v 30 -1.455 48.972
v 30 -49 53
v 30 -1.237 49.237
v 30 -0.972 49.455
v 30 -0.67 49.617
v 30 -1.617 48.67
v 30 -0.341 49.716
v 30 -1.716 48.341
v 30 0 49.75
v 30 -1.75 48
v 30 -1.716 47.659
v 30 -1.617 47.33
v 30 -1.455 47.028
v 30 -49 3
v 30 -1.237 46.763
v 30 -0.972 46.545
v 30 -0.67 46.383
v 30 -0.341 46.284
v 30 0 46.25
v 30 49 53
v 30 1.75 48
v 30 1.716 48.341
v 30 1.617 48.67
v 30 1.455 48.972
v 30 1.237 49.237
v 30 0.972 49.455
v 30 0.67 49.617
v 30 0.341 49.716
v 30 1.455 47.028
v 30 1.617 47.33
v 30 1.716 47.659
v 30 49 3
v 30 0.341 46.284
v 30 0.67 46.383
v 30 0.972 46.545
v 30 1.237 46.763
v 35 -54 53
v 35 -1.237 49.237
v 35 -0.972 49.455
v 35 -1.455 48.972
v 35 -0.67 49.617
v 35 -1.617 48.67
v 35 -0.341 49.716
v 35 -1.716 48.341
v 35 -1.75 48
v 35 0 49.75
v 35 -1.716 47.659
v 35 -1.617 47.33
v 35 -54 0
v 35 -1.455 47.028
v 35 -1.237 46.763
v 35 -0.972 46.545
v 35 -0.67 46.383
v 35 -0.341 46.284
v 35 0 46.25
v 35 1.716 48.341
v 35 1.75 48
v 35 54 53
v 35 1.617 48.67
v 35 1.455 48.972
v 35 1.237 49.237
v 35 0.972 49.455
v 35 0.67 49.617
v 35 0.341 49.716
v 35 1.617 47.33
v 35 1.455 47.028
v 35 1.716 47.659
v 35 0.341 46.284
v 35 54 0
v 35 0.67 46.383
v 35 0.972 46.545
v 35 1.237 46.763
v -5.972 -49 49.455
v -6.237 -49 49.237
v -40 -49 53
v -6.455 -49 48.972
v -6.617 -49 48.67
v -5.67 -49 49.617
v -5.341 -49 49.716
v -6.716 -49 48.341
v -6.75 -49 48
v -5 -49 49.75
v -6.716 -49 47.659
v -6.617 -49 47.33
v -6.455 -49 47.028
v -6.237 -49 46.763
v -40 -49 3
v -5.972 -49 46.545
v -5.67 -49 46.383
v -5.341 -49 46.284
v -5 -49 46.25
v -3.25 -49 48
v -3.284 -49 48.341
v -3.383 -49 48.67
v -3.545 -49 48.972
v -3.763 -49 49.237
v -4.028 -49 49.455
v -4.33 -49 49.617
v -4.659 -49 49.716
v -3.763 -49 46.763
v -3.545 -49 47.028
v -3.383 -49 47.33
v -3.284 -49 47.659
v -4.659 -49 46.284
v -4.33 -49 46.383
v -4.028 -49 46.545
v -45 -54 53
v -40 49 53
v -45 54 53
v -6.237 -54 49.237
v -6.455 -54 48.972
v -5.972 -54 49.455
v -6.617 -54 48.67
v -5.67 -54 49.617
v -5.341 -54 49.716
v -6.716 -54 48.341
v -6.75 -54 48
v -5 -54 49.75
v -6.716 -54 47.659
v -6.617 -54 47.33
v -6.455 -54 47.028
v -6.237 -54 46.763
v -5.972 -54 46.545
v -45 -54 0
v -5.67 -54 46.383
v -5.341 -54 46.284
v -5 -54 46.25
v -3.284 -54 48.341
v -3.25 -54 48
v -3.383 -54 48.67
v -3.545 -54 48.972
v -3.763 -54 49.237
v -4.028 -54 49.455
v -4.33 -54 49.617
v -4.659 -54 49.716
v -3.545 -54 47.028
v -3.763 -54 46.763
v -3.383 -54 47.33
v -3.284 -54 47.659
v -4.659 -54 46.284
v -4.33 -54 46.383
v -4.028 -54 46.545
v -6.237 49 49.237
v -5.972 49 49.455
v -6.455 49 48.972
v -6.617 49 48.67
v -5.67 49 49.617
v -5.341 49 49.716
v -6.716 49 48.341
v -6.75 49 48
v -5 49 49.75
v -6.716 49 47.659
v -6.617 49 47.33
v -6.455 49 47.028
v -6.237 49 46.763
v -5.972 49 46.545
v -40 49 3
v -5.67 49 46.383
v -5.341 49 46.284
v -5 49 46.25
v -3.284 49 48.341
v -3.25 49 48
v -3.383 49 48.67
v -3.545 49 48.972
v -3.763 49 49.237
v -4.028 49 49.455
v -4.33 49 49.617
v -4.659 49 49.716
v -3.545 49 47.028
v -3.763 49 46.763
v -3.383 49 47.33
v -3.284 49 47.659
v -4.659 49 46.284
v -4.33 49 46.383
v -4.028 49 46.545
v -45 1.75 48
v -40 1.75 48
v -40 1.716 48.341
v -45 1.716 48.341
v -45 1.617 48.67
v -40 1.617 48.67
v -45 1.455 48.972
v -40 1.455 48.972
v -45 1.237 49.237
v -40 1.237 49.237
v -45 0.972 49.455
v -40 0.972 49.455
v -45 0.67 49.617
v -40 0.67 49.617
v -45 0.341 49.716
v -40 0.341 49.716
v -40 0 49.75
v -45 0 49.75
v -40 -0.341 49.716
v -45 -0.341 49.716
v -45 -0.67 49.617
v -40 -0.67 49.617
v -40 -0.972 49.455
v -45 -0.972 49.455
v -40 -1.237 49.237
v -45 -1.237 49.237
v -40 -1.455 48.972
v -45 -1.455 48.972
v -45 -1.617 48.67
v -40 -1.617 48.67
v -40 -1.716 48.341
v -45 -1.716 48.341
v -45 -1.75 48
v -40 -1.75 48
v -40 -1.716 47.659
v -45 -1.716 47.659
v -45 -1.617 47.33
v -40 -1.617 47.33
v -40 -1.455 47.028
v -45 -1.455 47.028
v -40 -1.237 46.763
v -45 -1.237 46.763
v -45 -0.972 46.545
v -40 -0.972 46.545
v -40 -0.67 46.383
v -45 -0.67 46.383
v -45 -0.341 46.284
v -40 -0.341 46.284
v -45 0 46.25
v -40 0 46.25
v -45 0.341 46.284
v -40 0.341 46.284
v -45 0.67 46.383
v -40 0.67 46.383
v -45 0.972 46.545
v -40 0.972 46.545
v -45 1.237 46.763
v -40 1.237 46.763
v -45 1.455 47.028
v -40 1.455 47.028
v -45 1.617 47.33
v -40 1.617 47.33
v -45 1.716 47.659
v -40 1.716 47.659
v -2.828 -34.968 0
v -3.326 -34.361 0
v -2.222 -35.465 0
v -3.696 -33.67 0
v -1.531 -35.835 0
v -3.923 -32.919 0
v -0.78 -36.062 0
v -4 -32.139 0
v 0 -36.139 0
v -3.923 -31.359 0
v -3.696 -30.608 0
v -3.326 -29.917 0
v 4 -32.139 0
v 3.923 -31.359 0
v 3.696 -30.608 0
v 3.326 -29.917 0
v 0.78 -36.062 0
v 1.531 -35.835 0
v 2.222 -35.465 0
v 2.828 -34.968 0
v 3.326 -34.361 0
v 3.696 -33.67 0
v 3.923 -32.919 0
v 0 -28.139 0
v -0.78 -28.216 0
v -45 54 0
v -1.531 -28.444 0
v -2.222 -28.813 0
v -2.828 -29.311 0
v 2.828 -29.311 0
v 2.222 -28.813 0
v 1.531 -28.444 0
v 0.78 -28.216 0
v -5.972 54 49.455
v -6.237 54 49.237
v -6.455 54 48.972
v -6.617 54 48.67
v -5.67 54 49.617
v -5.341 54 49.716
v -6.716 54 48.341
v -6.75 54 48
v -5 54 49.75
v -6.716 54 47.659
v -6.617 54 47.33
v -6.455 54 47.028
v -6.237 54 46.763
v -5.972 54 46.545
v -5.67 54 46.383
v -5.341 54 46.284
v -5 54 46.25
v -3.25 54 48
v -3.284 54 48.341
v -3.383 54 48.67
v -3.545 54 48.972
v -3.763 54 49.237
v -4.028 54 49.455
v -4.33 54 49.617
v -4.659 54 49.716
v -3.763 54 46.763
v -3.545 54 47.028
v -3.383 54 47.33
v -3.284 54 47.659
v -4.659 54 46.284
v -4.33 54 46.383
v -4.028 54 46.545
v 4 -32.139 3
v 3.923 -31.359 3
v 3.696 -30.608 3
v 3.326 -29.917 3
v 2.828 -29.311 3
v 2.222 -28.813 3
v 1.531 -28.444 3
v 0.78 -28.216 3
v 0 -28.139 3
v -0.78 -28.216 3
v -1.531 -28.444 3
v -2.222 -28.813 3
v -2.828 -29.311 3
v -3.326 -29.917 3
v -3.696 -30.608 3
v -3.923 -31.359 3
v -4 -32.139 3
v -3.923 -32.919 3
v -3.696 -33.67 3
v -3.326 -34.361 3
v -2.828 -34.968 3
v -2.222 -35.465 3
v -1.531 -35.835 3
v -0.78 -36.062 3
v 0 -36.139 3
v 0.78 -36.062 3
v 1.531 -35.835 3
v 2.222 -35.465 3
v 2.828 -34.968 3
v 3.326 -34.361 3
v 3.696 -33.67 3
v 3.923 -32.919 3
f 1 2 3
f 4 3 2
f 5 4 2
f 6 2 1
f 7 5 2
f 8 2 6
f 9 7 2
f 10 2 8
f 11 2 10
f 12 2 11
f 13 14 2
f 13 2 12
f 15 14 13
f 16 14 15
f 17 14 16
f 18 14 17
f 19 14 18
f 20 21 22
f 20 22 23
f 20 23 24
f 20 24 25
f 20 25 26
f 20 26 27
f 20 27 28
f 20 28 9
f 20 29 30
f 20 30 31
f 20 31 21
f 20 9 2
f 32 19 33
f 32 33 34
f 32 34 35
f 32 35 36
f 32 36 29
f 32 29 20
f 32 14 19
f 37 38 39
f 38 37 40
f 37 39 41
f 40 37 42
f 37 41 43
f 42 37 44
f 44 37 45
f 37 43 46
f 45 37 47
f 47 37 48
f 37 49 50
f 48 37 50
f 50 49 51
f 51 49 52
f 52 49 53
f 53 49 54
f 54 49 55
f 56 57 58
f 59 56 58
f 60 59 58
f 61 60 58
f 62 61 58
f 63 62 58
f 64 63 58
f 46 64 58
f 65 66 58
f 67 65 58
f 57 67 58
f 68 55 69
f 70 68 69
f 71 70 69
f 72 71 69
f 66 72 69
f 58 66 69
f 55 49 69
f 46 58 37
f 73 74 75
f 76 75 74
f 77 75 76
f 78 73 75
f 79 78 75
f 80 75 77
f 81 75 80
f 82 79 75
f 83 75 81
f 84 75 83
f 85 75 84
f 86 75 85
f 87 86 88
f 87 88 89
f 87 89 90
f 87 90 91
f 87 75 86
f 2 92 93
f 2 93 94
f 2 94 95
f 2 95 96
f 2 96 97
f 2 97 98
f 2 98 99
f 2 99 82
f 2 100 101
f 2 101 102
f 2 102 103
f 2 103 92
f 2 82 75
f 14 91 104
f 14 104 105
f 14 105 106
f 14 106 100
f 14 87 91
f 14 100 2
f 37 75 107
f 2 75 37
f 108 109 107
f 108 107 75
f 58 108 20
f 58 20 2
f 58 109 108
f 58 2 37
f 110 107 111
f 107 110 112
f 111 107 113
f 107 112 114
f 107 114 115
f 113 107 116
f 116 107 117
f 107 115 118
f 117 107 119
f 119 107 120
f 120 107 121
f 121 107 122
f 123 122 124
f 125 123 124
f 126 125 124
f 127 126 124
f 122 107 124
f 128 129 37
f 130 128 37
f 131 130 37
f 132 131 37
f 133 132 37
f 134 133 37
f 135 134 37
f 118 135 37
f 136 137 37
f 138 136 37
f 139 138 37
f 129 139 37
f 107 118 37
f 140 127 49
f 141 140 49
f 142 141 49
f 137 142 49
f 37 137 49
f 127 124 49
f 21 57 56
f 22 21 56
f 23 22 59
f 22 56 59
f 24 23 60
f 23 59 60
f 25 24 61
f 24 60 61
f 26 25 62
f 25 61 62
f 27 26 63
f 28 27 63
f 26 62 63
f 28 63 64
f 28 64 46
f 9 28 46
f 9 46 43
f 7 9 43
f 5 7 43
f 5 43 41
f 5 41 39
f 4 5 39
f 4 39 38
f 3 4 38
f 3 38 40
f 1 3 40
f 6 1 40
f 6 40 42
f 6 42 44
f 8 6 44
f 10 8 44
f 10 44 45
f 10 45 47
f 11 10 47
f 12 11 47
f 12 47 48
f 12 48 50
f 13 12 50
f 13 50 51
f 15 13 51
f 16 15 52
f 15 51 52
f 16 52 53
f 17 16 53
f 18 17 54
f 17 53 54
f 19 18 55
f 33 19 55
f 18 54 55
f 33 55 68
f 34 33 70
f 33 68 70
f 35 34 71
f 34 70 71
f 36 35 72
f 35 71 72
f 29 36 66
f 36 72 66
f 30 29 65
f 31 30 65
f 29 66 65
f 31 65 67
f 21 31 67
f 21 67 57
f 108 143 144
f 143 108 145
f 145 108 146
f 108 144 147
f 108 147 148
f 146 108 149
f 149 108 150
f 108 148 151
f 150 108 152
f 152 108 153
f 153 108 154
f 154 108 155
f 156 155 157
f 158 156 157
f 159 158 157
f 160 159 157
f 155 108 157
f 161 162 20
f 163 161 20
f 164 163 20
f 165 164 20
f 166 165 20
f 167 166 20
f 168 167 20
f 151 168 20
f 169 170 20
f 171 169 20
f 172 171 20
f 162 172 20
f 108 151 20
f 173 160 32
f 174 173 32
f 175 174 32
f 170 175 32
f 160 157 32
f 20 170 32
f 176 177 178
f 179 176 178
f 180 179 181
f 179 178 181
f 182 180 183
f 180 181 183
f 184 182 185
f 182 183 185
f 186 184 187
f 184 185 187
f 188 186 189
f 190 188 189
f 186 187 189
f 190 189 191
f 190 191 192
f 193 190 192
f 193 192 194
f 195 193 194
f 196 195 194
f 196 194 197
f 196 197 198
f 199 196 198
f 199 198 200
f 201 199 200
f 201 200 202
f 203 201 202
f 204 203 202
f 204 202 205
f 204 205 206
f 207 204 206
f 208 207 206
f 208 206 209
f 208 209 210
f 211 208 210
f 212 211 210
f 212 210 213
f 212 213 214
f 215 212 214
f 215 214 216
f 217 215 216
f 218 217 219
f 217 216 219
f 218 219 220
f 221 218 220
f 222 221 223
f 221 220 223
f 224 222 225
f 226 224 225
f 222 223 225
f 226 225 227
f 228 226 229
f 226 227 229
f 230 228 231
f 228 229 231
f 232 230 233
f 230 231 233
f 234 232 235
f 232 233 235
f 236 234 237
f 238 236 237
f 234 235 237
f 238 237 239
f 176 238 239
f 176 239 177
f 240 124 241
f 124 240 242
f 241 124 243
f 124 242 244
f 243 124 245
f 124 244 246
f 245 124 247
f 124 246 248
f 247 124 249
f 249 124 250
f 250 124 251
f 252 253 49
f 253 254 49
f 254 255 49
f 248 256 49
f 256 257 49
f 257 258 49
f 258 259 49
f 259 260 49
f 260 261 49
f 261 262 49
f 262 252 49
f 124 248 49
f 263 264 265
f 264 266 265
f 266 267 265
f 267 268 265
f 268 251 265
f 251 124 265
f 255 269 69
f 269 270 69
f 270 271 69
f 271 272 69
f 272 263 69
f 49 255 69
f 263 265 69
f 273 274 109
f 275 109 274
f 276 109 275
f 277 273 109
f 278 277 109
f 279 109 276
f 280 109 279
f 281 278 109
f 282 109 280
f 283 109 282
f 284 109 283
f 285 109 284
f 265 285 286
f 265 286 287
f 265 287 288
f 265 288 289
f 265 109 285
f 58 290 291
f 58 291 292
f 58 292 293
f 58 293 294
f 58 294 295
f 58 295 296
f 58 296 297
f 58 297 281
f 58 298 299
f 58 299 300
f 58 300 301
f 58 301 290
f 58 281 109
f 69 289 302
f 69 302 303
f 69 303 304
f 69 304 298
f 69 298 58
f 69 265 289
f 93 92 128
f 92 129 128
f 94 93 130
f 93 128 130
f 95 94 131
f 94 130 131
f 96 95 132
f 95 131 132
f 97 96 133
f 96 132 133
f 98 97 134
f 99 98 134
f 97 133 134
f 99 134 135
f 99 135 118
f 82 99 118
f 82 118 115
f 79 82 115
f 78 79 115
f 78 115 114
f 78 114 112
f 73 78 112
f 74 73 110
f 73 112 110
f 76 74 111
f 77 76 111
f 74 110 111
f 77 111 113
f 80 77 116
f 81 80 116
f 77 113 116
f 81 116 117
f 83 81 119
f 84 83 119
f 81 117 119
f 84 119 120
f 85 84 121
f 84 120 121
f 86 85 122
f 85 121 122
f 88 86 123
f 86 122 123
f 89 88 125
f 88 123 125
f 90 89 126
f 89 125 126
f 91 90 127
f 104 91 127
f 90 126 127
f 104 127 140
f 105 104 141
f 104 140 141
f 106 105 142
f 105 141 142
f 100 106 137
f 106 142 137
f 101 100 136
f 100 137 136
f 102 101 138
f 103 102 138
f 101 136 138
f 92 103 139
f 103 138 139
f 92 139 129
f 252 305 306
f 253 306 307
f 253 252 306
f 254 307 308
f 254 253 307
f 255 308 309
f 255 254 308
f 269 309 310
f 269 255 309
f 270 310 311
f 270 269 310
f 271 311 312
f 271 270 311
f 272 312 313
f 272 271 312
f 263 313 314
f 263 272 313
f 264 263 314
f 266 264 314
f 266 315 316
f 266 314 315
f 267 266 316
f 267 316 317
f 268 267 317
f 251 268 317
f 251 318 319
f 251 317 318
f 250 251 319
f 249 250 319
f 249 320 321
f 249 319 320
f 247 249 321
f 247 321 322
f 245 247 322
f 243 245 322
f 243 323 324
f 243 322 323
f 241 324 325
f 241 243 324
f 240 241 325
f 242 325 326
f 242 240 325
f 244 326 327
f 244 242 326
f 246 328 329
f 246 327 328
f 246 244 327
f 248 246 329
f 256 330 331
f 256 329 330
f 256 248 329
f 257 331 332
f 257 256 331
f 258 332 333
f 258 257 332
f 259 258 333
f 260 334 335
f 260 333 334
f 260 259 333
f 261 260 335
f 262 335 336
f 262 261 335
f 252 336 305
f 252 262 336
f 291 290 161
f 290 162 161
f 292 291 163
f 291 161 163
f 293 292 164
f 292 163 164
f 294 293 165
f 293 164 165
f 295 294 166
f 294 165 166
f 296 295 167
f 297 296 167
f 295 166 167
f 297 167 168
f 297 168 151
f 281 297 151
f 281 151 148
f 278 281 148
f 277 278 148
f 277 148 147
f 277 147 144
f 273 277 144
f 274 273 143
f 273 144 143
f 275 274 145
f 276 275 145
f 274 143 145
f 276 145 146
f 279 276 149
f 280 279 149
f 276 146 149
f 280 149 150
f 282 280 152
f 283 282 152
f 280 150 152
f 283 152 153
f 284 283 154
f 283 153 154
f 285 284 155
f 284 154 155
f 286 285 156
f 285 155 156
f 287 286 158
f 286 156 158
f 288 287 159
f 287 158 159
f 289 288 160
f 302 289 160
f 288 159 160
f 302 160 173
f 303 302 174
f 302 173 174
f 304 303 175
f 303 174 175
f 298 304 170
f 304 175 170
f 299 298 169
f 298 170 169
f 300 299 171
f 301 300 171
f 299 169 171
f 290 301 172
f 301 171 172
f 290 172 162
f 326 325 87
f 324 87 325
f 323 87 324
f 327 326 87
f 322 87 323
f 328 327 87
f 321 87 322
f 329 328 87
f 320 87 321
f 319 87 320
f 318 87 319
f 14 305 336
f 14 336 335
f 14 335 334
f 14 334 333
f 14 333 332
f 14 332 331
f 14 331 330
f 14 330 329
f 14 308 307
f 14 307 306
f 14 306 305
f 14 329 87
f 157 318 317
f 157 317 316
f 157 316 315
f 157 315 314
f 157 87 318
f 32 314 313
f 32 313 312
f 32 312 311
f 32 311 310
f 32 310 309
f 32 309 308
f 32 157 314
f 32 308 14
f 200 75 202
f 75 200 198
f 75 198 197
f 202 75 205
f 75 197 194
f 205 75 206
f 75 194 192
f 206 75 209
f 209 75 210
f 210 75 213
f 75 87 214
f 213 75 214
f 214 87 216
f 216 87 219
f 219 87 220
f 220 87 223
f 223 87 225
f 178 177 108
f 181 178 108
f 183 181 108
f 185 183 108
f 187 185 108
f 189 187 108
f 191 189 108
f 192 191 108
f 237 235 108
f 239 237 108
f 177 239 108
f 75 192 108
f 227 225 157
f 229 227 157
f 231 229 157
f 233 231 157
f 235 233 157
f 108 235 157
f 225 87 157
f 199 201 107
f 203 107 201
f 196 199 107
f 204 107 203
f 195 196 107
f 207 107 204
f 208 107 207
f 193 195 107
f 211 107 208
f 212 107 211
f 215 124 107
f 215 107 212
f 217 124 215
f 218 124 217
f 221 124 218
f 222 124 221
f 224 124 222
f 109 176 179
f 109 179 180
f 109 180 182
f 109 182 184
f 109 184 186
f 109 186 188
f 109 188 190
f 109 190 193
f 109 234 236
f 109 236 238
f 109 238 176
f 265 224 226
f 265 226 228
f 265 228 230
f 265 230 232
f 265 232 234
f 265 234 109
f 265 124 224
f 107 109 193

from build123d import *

# Parameters (mm, degrees)
SKETCH_W        = 80
SKETCH_H        = 108
PAD_DEPTH       = 3
SKETCH001_W     = 80
SKETCH001_H     = 108
SKETCH001_W_2   = 70
SKETCH001_H_2   = 98
PAD001_DEPTH    = 50
SKETCH002_R     = 4
POCKET_DEPTH    = 5
SKETCH004_R     = 1.75
POCKET002_DEPTH = 125
SKETCH003_R     = 1.75
POCKET003_DEPTH = 105


with BuildPart() as part:
    # Sketch → Pad (new body)
    with BuildSketch(Plane.XY):
        with Locations((-5, 0)):
            Rectangle(SKETCH_W, SKETCH_H)
    extrude(amount=PAD_DEPTH)

    # Sketch001 → Pad001 (join)
    with BuildSketch(Plane.XY.offset(3)):
        with Locations((-5, 0)):
            Rectangle(SKETCH001_W, SKETCH001_H)
        with Locations((-5, 0)):
            Rectangle(SKETCH001_W_2, SKETCH001_H_2, mode=Mode.SUBTRACT)
    extrude(amount=PAD001_DEPTH)

    # Sketch002 → Pocket (cut)
    with BuildSketch(Plane.XY):
        with Locations((0, -32.139076)):
            Circle(SKETCH002_R)
    extrude(amount=POCKET_DEPTH, mode=Mode.SUBTRACT)

    # Sketch004 → Pocket002 (cut, symmetric)
    with BuildSketch(Plane.XZ.offset(52)):
        with Locations((-5, 48)):
            Circle(SKETCH004_R)
    extrude(amount=POCKET002_DEPTH, both=True, mode=Mode.SUBTRACT)

    # Sketch003 → Pocket003 (cut)
    with BuildSketch(Plane.YZ.offset(46.5)):
        with Locations((0, 48)):
            Circle(SKETCH003_R)
    extrude(amount=-POCKET003_DEPTH, mode=Mode.SUBTRACT)


solid = part.part
